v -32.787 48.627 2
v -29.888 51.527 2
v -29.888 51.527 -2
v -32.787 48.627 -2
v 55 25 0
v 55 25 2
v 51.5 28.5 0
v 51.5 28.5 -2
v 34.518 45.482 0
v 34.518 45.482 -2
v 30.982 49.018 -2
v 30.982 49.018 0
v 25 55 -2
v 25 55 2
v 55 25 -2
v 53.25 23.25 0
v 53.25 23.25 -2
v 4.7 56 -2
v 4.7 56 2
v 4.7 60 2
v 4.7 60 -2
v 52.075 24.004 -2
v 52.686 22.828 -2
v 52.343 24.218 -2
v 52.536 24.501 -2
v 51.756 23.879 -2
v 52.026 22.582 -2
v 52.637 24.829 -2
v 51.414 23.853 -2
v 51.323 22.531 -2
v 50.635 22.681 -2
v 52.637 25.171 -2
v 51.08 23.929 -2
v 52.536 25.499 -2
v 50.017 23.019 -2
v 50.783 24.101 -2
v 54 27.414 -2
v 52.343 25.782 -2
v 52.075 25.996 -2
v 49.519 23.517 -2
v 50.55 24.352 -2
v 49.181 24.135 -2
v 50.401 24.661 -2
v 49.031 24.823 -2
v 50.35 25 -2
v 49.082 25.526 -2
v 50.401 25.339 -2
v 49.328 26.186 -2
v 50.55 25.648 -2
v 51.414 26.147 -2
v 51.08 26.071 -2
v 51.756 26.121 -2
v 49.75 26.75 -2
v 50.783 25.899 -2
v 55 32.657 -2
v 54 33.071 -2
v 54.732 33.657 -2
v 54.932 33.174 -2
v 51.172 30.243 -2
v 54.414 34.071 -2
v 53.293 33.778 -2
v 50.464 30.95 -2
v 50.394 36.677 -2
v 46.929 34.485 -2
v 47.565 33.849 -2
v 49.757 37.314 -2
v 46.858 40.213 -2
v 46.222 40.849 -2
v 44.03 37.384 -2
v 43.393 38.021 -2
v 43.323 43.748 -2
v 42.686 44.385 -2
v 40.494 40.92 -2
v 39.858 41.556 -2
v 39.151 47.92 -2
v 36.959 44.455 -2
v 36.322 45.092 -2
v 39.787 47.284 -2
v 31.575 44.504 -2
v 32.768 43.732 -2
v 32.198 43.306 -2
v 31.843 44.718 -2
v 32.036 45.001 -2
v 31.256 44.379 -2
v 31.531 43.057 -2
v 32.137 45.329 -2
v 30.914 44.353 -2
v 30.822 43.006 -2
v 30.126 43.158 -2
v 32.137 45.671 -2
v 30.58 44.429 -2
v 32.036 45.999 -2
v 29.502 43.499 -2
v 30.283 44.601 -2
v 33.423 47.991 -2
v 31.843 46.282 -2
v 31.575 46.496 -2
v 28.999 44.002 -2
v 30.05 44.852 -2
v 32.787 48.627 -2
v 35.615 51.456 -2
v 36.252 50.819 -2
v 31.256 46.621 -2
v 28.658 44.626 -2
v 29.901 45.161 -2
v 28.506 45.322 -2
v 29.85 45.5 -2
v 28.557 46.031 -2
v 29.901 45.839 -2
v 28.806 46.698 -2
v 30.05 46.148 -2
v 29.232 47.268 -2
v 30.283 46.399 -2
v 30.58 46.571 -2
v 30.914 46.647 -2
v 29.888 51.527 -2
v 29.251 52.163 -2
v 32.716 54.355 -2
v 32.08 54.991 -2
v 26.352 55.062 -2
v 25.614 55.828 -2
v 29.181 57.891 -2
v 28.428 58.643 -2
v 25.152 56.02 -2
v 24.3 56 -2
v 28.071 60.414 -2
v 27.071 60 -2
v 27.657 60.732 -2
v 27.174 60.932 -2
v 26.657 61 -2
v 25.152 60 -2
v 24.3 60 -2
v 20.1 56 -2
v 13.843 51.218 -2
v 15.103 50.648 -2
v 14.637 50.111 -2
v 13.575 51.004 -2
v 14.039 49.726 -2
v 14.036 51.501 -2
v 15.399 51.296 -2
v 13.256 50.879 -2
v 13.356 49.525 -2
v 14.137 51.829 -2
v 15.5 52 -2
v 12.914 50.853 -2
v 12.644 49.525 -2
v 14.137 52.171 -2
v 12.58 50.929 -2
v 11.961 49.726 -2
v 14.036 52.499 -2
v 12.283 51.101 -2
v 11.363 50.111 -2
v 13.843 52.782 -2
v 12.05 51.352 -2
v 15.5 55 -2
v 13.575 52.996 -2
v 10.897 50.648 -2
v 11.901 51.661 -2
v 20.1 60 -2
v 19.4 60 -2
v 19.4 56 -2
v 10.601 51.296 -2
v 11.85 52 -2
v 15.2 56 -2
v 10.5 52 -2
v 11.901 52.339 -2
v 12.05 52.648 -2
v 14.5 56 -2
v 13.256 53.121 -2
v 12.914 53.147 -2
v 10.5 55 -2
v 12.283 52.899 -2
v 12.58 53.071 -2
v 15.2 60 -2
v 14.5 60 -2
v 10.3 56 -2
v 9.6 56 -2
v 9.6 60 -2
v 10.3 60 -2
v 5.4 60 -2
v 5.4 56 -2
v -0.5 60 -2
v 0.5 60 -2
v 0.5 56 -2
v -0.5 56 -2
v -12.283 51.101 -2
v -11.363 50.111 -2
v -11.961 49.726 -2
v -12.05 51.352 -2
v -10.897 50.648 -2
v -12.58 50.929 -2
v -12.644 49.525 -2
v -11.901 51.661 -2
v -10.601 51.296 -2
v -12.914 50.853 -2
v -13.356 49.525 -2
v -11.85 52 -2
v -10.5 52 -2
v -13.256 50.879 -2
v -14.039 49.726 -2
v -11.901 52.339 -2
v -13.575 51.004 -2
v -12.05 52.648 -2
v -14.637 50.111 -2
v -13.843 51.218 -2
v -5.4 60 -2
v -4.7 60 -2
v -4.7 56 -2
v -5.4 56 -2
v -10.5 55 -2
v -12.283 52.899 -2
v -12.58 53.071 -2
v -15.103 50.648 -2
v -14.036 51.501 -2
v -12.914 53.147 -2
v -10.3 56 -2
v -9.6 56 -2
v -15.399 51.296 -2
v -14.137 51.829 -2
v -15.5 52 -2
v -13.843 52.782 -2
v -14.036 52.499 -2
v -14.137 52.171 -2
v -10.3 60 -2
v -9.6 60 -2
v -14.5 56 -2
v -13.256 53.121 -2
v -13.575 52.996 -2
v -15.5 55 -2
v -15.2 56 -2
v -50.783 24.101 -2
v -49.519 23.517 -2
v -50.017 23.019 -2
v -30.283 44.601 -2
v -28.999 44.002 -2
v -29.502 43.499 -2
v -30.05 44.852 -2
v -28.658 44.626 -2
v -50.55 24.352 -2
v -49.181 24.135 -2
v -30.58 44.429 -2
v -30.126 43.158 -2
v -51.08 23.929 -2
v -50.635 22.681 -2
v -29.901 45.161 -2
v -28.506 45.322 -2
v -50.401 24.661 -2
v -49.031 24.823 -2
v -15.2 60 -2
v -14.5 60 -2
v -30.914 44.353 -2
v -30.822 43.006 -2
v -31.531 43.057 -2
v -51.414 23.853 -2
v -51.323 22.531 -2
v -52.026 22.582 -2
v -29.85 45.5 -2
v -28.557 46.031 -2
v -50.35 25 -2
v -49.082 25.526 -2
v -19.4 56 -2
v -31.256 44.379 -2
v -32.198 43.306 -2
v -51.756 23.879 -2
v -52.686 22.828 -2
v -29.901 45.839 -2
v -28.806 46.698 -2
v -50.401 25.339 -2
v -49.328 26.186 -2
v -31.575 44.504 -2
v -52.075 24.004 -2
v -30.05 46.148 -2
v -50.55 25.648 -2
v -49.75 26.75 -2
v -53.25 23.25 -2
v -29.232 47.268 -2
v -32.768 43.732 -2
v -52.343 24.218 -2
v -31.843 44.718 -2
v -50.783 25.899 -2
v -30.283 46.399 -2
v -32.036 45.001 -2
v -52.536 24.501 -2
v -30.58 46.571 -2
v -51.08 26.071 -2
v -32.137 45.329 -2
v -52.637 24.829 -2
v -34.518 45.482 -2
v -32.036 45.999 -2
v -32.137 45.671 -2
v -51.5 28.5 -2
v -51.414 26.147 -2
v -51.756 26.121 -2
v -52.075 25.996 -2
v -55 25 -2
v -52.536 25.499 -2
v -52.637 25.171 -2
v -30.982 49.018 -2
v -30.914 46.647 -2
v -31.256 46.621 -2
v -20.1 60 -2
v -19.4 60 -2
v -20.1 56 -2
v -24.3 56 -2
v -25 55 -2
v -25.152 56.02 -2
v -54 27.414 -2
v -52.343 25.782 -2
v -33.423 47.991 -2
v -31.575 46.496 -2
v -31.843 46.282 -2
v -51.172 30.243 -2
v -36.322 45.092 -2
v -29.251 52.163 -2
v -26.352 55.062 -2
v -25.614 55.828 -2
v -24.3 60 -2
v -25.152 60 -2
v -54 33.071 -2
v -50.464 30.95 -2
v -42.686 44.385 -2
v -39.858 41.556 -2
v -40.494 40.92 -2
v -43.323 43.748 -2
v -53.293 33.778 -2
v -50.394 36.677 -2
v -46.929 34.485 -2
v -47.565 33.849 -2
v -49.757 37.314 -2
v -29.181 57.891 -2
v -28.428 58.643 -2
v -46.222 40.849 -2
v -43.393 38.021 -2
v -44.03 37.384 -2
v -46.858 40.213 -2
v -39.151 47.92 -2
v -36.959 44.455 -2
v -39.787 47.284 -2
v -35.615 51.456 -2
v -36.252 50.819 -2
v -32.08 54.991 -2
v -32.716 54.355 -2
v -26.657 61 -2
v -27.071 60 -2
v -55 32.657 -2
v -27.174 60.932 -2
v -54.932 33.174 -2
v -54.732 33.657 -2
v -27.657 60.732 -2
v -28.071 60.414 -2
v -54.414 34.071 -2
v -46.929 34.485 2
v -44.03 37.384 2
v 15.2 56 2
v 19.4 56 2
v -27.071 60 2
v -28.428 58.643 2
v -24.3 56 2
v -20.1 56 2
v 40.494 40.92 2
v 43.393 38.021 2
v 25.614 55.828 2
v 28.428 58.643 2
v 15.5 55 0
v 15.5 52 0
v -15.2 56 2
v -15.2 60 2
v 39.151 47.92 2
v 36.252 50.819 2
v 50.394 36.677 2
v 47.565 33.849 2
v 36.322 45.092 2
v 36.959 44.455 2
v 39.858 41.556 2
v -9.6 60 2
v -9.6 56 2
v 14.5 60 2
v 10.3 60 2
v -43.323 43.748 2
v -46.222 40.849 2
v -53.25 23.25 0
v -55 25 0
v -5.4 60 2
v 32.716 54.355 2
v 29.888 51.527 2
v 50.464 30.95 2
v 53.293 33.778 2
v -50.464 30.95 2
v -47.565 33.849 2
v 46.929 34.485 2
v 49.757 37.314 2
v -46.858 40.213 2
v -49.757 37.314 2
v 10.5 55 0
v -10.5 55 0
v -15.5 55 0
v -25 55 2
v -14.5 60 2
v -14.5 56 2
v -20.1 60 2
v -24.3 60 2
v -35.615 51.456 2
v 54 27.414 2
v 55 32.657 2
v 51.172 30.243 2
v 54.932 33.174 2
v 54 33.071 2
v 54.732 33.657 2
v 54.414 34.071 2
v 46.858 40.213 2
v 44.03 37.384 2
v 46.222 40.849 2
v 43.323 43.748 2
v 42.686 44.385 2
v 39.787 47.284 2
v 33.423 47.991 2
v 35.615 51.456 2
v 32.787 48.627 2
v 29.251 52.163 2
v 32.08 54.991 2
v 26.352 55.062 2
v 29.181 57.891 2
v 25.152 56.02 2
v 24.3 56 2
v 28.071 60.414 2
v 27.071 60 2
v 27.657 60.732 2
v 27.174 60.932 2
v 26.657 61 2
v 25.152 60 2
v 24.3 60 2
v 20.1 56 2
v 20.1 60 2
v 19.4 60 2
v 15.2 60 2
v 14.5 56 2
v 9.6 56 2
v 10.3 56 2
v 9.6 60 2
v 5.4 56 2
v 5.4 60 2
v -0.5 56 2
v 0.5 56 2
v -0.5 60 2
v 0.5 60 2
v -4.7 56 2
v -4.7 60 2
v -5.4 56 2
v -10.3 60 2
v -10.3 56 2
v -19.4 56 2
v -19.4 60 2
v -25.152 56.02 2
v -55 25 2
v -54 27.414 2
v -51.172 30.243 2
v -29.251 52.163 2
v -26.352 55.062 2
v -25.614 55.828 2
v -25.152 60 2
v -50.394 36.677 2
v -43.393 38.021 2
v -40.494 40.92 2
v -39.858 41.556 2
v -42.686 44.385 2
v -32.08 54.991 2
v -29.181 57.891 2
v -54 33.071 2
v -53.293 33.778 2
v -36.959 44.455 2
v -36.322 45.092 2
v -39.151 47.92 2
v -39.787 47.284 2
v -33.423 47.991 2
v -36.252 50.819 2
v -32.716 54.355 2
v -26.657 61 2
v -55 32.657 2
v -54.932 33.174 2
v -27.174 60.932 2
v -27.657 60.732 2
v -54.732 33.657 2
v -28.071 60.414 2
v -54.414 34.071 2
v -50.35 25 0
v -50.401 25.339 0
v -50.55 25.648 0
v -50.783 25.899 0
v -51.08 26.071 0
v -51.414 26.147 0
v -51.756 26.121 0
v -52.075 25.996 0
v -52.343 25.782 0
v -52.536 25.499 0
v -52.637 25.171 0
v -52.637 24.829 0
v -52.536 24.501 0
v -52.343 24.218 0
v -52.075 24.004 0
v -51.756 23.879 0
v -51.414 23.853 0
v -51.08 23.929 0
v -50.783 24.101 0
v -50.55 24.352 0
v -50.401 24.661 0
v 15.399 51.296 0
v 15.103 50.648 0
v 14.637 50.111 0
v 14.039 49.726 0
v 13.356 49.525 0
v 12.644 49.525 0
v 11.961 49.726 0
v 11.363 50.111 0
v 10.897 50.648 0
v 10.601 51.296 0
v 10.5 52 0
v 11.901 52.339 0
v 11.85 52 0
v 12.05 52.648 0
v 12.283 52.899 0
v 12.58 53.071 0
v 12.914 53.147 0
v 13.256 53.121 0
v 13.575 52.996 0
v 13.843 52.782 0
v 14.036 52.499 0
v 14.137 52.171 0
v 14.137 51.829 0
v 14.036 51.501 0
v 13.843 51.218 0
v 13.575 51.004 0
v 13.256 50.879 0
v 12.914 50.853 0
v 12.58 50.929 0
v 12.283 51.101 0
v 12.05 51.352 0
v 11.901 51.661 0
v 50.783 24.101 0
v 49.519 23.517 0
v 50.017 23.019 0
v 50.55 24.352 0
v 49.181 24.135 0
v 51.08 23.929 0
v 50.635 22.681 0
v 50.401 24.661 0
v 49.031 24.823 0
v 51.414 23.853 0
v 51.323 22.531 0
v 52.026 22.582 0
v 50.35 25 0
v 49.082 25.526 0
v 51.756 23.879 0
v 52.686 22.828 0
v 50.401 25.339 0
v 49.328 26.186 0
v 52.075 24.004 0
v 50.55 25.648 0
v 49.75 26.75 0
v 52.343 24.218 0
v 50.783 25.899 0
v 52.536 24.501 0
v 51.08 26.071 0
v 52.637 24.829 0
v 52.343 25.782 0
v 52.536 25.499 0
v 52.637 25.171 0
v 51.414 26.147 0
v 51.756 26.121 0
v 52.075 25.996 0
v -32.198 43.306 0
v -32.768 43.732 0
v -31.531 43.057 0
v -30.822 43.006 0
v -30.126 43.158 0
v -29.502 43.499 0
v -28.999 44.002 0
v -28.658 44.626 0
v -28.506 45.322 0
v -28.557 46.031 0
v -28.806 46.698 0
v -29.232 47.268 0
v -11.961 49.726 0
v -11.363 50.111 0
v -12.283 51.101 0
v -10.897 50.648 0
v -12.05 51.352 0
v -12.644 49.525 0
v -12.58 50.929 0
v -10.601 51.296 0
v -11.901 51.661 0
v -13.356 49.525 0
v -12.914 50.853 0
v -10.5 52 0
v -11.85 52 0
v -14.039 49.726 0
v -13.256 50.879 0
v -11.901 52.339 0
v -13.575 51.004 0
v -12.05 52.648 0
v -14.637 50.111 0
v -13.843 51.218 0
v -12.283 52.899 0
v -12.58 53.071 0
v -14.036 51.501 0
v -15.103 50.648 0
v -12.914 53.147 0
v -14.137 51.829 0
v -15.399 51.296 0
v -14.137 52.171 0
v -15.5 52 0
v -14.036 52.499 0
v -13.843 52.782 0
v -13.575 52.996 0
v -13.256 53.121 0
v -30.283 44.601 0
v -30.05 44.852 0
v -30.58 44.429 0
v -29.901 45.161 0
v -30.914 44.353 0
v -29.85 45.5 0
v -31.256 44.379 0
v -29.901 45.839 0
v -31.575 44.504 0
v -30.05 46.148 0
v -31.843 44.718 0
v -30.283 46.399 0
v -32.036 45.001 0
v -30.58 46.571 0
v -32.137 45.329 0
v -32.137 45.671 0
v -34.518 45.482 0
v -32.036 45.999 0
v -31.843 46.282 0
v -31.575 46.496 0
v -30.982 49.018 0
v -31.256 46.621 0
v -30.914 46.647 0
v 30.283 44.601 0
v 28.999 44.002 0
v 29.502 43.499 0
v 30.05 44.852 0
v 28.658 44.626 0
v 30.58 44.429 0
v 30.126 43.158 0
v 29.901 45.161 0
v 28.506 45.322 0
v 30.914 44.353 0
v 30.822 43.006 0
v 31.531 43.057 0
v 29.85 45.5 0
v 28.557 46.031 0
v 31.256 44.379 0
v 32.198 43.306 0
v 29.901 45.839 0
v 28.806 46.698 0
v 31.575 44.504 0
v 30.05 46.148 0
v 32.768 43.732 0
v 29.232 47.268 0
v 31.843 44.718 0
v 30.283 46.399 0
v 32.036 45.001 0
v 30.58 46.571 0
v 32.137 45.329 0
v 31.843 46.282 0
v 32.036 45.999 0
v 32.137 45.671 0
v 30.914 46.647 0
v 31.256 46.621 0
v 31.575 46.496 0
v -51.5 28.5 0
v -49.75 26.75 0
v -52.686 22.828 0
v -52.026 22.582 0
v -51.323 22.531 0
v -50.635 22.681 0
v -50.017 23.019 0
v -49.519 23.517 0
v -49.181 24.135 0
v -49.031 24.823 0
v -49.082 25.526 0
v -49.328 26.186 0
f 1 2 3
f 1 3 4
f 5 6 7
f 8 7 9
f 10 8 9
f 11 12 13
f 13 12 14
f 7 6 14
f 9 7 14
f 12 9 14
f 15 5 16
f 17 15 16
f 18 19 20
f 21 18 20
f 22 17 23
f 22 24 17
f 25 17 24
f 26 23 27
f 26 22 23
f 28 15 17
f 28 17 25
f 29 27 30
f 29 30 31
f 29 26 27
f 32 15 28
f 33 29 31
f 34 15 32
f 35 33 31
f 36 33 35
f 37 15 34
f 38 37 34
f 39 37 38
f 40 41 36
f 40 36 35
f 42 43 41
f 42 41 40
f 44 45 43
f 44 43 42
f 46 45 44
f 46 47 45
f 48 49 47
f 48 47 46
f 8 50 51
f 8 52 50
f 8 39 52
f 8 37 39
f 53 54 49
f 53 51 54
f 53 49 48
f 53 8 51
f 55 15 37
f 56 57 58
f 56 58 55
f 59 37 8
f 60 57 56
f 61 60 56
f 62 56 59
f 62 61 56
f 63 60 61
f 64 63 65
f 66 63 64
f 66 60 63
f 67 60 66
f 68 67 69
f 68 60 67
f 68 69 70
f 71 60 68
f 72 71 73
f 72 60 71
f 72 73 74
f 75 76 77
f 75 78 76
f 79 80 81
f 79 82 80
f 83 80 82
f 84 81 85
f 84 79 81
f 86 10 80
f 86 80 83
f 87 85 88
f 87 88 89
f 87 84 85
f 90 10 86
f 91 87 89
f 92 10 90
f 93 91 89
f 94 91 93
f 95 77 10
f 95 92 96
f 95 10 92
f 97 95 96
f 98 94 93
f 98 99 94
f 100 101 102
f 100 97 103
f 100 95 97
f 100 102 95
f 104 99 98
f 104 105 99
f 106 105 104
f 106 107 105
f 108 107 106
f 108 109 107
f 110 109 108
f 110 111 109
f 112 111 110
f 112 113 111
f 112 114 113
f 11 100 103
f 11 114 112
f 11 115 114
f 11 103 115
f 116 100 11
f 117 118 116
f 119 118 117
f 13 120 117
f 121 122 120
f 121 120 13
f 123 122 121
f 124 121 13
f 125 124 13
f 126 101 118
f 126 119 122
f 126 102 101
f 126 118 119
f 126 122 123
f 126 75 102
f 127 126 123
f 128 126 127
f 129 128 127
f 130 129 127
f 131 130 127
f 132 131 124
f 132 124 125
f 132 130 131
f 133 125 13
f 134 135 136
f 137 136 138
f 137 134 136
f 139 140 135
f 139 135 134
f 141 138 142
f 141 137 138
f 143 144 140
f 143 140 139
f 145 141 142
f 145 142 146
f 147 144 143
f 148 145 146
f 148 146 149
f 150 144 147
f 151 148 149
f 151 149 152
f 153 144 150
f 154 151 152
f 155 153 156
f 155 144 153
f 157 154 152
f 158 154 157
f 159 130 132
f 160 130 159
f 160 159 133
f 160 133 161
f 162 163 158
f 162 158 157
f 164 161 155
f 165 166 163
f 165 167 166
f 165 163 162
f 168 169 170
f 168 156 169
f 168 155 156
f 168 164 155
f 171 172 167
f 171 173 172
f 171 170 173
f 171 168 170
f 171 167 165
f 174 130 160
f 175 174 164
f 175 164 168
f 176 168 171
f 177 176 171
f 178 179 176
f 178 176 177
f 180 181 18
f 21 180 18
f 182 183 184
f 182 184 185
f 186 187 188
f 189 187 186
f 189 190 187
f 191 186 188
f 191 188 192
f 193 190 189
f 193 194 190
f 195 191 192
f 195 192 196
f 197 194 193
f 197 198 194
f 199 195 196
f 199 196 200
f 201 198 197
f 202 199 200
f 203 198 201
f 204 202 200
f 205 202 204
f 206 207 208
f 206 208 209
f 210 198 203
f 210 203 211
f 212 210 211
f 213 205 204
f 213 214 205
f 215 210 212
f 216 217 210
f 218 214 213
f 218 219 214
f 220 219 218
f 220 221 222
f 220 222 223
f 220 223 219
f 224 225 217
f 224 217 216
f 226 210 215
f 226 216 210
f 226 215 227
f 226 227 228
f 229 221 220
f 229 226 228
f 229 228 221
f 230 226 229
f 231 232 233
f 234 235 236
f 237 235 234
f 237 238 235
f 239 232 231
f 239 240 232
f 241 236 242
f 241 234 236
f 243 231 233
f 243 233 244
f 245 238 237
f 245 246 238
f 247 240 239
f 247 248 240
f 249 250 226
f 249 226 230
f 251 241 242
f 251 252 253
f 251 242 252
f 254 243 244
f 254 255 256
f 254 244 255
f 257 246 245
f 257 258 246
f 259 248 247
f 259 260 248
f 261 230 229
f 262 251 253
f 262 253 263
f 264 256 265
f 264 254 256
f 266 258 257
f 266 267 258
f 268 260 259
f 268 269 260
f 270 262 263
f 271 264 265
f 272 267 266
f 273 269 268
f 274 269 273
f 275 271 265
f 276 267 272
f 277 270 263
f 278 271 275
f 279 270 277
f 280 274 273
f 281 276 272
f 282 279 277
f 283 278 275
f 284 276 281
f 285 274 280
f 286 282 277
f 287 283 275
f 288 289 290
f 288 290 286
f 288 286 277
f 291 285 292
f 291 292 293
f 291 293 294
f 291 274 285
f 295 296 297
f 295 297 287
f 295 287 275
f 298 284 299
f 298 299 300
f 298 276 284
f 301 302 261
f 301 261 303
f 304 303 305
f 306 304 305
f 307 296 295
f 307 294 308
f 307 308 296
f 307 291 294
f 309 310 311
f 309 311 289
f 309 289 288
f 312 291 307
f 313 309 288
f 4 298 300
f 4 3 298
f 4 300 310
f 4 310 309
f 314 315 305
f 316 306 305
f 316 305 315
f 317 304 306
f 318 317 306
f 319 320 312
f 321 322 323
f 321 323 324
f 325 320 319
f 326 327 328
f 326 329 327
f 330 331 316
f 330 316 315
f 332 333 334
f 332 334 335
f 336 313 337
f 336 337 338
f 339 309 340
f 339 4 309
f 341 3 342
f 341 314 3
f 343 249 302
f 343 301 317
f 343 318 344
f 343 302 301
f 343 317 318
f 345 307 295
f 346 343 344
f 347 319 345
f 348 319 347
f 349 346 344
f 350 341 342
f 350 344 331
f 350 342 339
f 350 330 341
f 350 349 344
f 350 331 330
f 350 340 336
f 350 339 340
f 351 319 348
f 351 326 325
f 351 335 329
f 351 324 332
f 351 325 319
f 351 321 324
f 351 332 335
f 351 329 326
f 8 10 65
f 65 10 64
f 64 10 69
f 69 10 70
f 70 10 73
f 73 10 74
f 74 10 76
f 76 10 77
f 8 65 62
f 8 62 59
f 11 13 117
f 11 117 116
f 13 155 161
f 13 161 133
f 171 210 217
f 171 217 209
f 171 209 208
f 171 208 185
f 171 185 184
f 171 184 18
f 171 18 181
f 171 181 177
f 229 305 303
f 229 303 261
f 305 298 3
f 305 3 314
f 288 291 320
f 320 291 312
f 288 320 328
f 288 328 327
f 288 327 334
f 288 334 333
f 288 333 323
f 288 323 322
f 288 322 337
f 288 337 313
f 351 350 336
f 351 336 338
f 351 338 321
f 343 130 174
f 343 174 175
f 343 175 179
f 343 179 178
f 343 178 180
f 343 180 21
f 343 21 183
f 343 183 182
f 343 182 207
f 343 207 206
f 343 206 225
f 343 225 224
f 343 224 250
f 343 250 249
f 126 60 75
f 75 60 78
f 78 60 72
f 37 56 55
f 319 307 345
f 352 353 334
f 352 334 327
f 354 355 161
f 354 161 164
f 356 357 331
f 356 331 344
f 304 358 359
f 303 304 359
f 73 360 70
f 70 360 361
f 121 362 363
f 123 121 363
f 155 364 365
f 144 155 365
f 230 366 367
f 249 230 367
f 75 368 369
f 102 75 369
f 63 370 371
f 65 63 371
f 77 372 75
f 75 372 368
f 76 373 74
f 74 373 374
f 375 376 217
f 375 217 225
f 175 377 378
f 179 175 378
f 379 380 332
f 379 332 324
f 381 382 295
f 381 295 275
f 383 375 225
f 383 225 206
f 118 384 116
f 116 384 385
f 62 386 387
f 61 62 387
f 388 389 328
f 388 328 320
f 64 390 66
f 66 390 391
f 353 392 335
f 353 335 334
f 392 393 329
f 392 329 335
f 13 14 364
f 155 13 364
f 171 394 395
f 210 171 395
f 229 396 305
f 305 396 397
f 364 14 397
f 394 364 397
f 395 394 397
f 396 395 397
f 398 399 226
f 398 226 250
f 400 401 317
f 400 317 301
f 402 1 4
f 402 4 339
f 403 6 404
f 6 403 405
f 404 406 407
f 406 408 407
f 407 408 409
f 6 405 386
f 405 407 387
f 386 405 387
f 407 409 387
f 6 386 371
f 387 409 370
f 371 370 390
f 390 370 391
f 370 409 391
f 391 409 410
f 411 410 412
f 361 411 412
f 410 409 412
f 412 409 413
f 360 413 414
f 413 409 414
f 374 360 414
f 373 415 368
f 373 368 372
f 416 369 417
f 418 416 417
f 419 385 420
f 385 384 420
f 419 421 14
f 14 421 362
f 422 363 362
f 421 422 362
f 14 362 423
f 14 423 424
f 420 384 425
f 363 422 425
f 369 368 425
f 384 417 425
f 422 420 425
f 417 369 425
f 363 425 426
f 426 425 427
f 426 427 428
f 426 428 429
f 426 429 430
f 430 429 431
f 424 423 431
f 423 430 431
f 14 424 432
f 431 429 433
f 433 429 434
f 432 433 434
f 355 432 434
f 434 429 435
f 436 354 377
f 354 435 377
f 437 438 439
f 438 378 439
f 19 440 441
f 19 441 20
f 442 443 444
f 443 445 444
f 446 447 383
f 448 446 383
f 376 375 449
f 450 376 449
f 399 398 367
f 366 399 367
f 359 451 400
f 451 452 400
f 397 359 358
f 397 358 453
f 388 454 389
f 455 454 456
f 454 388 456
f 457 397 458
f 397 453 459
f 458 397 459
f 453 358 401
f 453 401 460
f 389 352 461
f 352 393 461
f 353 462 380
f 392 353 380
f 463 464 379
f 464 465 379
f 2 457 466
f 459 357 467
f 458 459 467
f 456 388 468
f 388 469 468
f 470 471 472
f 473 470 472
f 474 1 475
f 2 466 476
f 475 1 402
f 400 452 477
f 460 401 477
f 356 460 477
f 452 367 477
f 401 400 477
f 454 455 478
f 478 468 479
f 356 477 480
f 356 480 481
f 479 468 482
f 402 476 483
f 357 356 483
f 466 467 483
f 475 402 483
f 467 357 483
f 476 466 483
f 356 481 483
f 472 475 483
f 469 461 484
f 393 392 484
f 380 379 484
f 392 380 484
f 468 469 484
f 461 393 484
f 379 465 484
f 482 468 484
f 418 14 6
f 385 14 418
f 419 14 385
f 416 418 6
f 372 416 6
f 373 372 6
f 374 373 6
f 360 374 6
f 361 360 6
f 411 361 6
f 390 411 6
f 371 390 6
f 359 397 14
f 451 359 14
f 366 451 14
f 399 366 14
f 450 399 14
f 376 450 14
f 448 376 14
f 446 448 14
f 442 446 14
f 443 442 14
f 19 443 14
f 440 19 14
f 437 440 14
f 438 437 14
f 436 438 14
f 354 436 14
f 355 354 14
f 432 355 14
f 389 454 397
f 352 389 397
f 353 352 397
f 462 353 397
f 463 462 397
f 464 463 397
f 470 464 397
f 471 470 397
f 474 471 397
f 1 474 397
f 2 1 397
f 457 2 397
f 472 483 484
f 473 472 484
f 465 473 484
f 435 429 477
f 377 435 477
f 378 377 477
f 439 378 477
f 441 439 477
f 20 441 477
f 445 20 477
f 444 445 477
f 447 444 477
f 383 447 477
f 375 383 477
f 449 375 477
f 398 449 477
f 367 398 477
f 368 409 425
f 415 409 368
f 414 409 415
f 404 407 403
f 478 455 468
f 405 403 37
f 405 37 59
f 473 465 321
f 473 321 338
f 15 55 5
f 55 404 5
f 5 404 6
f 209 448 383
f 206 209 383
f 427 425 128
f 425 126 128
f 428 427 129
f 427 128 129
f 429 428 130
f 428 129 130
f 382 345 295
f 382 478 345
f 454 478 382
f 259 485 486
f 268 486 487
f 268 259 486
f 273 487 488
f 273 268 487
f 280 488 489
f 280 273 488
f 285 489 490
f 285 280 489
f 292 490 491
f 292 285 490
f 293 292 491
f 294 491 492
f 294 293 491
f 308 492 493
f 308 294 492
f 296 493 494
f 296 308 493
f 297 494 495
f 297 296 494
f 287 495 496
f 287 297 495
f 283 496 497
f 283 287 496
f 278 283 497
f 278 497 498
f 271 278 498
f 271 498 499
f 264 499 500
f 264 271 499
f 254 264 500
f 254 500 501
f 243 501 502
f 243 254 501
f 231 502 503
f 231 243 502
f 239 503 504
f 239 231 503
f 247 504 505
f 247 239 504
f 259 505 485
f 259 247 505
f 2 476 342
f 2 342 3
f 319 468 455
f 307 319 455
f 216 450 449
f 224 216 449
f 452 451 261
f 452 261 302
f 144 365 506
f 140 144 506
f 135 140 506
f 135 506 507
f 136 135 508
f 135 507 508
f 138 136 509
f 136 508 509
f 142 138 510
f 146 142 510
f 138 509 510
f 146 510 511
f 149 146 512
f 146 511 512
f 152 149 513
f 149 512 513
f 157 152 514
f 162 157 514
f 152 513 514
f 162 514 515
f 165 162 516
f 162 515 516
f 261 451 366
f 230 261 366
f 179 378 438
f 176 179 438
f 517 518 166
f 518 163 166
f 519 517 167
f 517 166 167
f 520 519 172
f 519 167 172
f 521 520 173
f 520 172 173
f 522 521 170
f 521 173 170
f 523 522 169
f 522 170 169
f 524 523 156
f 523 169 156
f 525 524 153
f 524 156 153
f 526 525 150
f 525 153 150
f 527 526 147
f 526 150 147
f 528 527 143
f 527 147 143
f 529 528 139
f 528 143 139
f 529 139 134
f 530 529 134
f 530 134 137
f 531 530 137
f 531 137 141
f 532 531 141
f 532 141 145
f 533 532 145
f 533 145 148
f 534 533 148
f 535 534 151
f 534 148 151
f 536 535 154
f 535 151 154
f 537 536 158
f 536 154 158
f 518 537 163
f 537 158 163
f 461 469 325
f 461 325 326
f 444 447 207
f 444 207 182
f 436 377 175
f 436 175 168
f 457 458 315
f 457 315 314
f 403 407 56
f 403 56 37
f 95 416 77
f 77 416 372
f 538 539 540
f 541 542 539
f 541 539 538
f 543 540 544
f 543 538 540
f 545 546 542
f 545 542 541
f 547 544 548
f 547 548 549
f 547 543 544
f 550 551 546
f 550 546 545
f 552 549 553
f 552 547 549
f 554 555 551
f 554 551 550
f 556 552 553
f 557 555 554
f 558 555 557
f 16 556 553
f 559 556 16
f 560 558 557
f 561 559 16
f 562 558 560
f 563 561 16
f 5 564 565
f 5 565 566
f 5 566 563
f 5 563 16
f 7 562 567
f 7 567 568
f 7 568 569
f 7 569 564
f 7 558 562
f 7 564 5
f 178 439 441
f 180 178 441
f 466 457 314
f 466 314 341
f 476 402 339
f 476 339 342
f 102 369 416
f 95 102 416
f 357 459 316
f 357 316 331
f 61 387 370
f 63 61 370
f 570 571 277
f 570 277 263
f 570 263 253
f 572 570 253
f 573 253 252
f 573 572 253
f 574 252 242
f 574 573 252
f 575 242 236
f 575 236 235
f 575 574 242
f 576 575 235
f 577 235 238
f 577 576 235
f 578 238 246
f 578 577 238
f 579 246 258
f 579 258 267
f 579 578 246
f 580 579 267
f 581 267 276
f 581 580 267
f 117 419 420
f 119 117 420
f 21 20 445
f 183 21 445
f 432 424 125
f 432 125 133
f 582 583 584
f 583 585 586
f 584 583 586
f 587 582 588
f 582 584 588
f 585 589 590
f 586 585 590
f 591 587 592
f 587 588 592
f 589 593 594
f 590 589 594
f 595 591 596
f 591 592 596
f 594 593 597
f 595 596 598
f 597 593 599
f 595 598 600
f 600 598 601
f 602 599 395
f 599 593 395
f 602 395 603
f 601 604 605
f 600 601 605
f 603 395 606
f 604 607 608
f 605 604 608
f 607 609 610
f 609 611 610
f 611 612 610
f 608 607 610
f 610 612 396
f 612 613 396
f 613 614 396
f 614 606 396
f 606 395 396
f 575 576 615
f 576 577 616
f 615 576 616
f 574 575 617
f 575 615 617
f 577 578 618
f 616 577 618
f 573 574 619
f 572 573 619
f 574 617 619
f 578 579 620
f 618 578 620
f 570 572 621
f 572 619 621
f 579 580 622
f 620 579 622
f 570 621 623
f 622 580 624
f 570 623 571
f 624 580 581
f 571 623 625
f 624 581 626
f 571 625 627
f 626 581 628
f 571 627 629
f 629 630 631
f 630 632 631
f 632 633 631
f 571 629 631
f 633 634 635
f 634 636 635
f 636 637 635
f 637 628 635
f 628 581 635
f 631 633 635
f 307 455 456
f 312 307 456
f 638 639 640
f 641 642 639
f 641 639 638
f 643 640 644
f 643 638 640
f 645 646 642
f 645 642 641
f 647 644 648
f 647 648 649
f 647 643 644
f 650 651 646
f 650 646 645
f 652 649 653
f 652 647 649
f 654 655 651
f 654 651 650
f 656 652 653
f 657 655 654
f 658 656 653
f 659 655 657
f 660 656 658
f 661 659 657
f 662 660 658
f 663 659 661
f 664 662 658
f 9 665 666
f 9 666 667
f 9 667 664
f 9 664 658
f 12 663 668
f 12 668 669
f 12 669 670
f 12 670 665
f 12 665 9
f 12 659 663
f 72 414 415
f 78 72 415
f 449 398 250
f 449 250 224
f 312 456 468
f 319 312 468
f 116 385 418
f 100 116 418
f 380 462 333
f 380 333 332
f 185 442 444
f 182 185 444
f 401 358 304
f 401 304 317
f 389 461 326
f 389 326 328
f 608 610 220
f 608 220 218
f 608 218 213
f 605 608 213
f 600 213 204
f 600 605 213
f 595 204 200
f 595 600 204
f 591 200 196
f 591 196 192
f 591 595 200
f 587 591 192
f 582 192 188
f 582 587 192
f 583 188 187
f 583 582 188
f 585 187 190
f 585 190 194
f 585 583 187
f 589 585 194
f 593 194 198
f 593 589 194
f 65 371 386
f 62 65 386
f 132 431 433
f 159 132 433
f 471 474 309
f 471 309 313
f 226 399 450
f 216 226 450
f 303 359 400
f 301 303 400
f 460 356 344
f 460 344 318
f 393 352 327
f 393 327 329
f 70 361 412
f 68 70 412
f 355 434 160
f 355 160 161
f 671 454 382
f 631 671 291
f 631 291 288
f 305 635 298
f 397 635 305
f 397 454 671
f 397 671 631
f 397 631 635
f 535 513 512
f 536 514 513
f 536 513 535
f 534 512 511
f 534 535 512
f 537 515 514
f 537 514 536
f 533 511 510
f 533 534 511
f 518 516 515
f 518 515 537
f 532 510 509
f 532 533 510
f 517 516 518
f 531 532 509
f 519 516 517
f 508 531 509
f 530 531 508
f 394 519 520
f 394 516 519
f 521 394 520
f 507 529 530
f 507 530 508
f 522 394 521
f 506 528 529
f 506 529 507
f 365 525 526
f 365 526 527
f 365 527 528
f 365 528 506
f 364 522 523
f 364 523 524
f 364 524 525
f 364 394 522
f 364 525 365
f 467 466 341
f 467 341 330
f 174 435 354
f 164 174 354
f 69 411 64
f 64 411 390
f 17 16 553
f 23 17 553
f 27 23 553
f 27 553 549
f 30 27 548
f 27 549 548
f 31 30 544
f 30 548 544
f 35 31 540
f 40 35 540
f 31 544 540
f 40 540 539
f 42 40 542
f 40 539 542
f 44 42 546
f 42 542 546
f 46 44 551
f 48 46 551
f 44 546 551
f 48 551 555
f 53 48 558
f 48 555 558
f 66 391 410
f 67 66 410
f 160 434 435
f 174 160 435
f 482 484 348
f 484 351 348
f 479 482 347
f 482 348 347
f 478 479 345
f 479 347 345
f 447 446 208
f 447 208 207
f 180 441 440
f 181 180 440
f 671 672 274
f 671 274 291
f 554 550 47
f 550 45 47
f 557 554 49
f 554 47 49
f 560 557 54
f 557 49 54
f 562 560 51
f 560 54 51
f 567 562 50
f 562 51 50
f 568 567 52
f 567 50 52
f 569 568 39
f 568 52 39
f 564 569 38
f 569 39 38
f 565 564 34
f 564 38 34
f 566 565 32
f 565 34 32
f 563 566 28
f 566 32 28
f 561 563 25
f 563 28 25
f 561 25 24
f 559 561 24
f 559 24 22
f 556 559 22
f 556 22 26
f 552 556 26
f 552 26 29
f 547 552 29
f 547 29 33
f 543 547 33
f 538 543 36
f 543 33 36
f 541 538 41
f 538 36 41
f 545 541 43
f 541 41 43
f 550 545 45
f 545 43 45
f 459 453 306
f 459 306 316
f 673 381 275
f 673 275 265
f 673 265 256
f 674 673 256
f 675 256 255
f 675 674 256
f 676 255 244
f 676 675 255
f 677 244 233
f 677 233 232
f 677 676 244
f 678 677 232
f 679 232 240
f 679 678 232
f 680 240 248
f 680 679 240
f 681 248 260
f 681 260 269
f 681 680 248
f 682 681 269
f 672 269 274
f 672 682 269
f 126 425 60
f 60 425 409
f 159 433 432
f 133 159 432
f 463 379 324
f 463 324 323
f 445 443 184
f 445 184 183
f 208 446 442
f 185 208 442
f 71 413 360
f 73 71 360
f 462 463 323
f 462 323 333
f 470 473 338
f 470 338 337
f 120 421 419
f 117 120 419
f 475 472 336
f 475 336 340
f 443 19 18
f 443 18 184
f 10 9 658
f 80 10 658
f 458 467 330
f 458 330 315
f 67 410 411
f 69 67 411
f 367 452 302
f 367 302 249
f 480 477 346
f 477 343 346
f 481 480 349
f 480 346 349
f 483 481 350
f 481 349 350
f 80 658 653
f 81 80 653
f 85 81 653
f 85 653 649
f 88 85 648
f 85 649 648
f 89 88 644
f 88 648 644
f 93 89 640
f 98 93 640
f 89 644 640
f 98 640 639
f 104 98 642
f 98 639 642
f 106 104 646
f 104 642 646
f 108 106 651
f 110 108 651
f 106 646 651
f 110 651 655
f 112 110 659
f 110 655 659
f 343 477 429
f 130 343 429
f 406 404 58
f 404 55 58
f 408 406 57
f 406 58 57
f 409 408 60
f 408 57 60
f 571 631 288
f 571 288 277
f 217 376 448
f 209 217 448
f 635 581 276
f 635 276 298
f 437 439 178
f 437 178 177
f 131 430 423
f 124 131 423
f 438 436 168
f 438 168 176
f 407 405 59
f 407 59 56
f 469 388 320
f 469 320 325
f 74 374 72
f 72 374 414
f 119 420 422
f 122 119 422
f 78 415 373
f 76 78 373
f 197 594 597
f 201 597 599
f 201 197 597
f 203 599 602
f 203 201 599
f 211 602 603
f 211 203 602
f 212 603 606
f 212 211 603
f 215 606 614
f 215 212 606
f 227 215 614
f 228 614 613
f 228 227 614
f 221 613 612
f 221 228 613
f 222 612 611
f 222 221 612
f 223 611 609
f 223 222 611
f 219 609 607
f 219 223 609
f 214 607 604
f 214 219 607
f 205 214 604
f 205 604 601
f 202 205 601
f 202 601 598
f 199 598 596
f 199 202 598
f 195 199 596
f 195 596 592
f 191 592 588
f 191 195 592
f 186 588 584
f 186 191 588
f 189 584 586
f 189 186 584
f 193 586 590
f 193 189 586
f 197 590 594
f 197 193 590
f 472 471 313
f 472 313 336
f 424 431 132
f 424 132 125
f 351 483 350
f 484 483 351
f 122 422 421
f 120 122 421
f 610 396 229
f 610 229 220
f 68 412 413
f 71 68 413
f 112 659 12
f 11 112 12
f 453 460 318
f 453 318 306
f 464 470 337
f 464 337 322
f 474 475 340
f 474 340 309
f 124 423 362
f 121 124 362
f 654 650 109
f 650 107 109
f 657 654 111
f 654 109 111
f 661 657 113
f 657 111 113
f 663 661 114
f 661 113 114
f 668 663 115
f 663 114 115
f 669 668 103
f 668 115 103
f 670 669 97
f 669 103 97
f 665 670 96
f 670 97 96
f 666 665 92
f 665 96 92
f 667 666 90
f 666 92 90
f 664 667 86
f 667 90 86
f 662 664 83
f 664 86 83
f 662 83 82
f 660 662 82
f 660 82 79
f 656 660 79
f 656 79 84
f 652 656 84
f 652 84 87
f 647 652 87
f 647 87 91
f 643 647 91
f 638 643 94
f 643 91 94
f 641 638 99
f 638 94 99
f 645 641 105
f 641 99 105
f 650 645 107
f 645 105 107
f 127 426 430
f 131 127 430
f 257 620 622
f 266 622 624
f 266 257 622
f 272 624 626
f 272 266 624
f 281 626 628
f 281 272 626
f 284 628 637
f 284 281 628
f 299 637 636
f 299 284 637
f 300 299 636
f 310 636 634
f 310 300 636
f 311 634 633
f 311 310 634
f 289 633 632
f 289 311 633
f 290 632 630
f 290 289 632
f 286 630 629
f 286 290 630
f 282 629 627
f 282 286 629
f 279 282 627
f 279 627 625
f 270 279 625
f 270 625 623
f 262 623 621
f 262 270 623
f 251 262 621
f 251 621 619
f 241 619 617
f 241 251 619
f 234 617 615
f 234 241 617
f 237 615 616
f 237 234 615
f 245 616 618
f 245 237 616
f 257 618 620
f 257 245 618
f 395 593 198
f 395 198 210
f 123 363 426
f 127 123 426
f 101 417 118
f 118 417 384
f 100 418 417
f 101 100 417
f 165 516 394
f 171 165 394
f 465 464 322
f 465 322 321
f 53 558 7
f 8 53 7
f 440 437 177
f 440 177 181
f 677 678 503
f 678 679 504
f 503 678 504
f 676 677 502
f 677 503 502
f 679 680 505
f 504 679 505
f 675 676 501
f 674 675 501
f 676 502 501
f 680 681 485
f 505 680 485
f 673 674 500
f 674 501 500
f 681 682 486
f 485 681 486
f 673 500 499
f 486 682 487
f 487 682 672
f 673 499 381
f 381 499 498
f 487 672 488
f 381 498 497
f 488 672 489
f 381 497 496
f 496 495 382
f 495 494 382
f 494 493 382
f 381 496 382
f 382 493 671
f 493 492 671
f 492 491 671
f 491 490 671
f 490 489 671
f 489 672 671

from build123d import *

# Parameters (mm, degrees)
SKETCH3_R                = 1.15
BOSS_EXTRUDE1_DEPTH      = 2
CUT_EXTRUDE4_DEPTH       = 2
FILLET1_R                = 2
CUT_EXTRUDE1_DEPTH       = 83.231380871
CUT_EXTRUDE2_DEPTH       = 83.158383626
LPATTERN1_COUNT          = 7
LPATTERN1_PITCH          = 5
SKETCH7_W                = 4.2
SKETCH7_H                = 4
CUT_EXTRUDE3_DEPTH       = 83.158383626
LPATTERN2_COUNT          = 5
LPATTERN2_PITCH          = 4.9
MIRROR1_COPY_1_DEPTH     = 83.158383626
MIRROR1_COPY_2_DEPTH     = 83.158383626
MIRROR1_COPY_3_DEPTH     = 83.158383626
MIRROR1_COPY_4_DEPTH     = 83.158383626
MIRROR1_COPY_5_DEPTH     = 83.158383626
MIRROR1_COPY_6_DEPTH     = 83.158383626
MIRROR1_COPY_7_SKETCH_W  = 4.2
MIRROR1_COPY_7_SKETCH_H  = 4
MIRROR1_COPY_7_DEPTH     = 83.158383626
MIRROR1_COPY_8_SKETCH_W  = 4.2
MIRROR1_COPY_8_SKETCH_H  = 4
MIRROR1_COPY_8_DEPTH     = 83.158383626
MIRROR1_COPY_9_SKETCH_W  = 4.2
MIRROR1_COPY_9_SKETCH_H  = 4
MIRROR1_COPY_9_DEPTH     = 83.158383626
MIRROR1_COPY_10_SKETCH_W = 4.2
MIRROR1_COPY_10_SKETCH_H = 4
MIRROR1_COPY_10_DEPTH    = 83.158383626
FILLET1_OF_MIRROR1_R     = 2


with BuildPart() as part:
    # Sketch3 → Boss-Extrude1 (new, symmetric)
    with BuildSketch(Plane.XY):
        with BuildLine():
            Line((-55, 25), (-53.25, 23.25))
            ThreePointArc((-53.25, 23.25), (-49.75, 23.25), (-49.75, 26.75))
            Line((-49.75, 26.75), (-51.5, 28.5))
            Line((-51.5, 28.5), (-34.517766953, 45.482233047))
            Line((-34.517766953, 45.482233047), (-32.767766953, 43.732233047))
            ThreePointArc((-32.767766953, 43.732233047), (-29.232233047, 43.732233047), (-29.232233047, 47.267766953))
            Line((-29.232233047, 47.267766953), (-30.982233047, 49.017766953))
            Line((-30.982233047, 49.017766953), (-25, 55))
            Line((-25, 55), (-15.5, 55))
            Line((-15.5, 55), (-15.5, 52))
            ThreePointArc((-15.5, 52), (-13, 49.5), (-10.5, 52))
            Line((-10.5, 52), (-10.5, 55))
            Line((-10.5, 55), (0, 55))
            Line((0, 55), (0, 61))
            Line((0, 61), (-27.485281374, 61))
            Line((-27.485281374, 61), (-55, 33.485281374))
            Line((-55, 33.485281374), (-55, 25))
        make_face()
        with Locations((-13, 52)):
            Circle(SKETCH3_R, mode=Mode.SUBTRACT)
        with Locations((-31, 45.5)):
            Circle(SKETCH3_R, mode=Mode.SUBTRACT)
        with Locations((-51.5, 25)):
            Circle(SKETCH3_R, mode=Mode.SUBTRACT)
    boss_extrude1 = extrude(amount=BOSS_EXTRUDE1_DEPTH, both=True)

    # Sketch8 → Cut-Extrude4 (cut)
    with BuildSketch(Plane.XY.offset(2)):
        with BuildLine():
            Line((-55, 25), (-51.5, 28.5))
            Line((-51.5, 28.5), (-49.75, 26.75))
            ThreePointArc((-49.75, 26.75), (-49.75, 23.25), (-53.25, 23.25))
            Line((-53.25, 23.25), (-55, 25))
        make_face()
        with BuildLine():
            Line((-34.517766953, 45.482233047), (-30.982233047, 49.017766953))
            Line((-30.982233047, 49.017766953), (-29.232233047, 47.267766953))
            ThreePointArc((-29.232233047, 47.267766953), (-29.232233047, 43.732233047), (-32.767766953, 43.732233047))
            Line((-32.767766953, 43.732233047), (-34.517766953, 45.482233047))
        make_face()
        with BuildLine():
            Line((-15.5, 55), (-10.5, 55))
            Line((-10.5, 55), (-10.5, 52))
            ThreePointArc((-10.5, 52), (-13, 49.5), (-15.5, 52))
            Line((-15.5, 52), (-15.5, 55))
        make_face()
    cut_extrude4 = extrude(amount=-CUT_EXTRUDE4_DEPTH, mode=Mode.SUBTRACT)

    # Fillet1
    fillet1_edges = [part.edges().sort_by_distance(p)[0] for p in [
        (-55, 33.485281374, 0),
        (-27.485281374, 61, 0),
    ]]
    fillet(fillet1_edges, radius=FILLET1_R)

    # Sketch5 → Cut-Extrude1 (cut, through all)
    with BuildSketch(Plane.XY.offset(2)):
        Polygon((-28.428256226, 58.642811585), (-27.071067812, 60), (-25.151713549, 60), (-25.151713549, 56.019550391), (-25.613653315, 55.828208674), align=None)
        Polygon((-54, 33.071067812), (-54, 27.414213562), (-51.171572875, 30.242640687), align=None)
    cut_extrude1 = extrude(amount=-CUT_EXTRUDE1_DEPTH, mode=Mode.SUBTRACT)

    # Sketch6 → Cut-Extrude2 (cut, symmetric)
    with BuildSketch(Plane.XY):
        Polygon((-53.292893219, 33.778174593), (-50.393755416, 36.677312396), (-47.565328291, 33.848885271), (-50.464466094, 30.949747468), align=None)
    cut_extrude2 = extrude(amount=CUT_EXTRUDE2_DEPTH, both=True, mode=Mode.SUBTRACT)

    # LPattern1: Cut-Extrude2 ×7
    with Locations(*[Vector(0.7071067811865472, 0.7071067811865478, 0) * (i * LPATTERN1_PITCH) for i in range(1, LPATTERN1_COUNT)]):
        add(cut_extrude2, mode=Mode.SUBTRACT)

    # Sketch7 → Cut-Extrude3 (cut, symmetric)
    with BuildSketch(Plane.XY):
        with Locations((-2.6, 58)):
            Rectangle(SKETCH7_W, SKETCH7_H)
    cut_extrude3 = extrude(amount=CUT_EXTRUDE3_DEPTH, both=True, mode=Mode.SUBTRACT)

    # LPattern2: Cut-Extrude3 ×5
    with Locations(*[(-i * LPATTERN2_PITCH, 0, 0) for i in range(1, LPATTERN2_COUNT)]):
        add(cut_extrude3, mode=Mode.SUBTRACT)

    # Mirror1: Boss-Extrude1, Cut-Extrude4, Cut-Extrude1, Cut-Extrude2, Cut-Extrude3 across plane
    add(boss_extrude1.mirror(Plane(origin=(0, 55, 2), x_dir=(0, 0, 1), z_dir=(-1, 0, 0))))
    add(cut_extrude4.mirror(Plane(origin=(0, 55, 2), x_dir=(0, 0, 1), z_dir=(-1, 0, 0))), mode=Mode.SUBTRACT)
    add(cut_extrude1.mirror(Plane(origin=(0, 55, 2), x_dir=(0, 0, 1), z_dir=(-1, 0, 0))), mode=Mode.SUBTRACT)
    add(cut_extrude2.mirror(Plane(origin=(0, 55, 2), x_dir=(0, 0, 1), z_dir=(-1, 0, 0))), mode=Mode.SUBTRACT)
    add(cut_extrude3.mirror(Plane(origin=(0, 55, 2), x_dir=(0, 0, 1), z_dir=(-1, 0, 0))), mode=Mode.SUBTRACT)

    # Mirror1 copy 1 sketch → Mirror1 copy 1 (cut, symmetric)
    with BuildSketch(Plane(origin=(-3.535533906, 3.535533906, 0), x_dir=(-1, 0, 0), z_dir=(0, 0, 1))):
        Polygon((-53.292893219, -33.778174593), (-50.393755416, -36.677312396), (-47.565328291, -33.848885271), (-50.464466094, -30.949747468), align=None)
    extrude(amount=MIRROR1_COPY_1_DEPTH, both=True, mode=Mode.SUBTRACT)

    # Mirror1 copy 2 sketch → Mirror1 copy 2 (cut, symmetric)
    with BuildSketch(Plane(origin=(-7.071067812, 7.071067812, 0), x_dir=(-1, 0, 0), z_dir=(0, 0, 1))):
        Polygon((-53.292893219, -33.778174593), (-50.393755416, -36.677312396), (-47.565328291, -33.848885271), (-50.464466094, -30.949747468), align=None)
    extrude(amount=MIRROR1_COPY_2_DEPTH, both=True, mode=Mode.SUBTRACT)

    # Mirror1 copy 3 sketch → Mirror1 copy 3 (cut, symmetric)
    with BuildSketch(Plane(origin=(-10.606601718, 10.606601718, 0), x_dir=(-1, 0, 0), z_dir=(0, 0, 1))):
        Polygon((-53.292893219, -33.778174593), (-50.393755416, -36.677312396), (-47.565328291, -33.848885271), (-50.464466094, -30.949747468), align=None)
    extrude(amount=MIRROR1_COPY_3_DEPTH, both=True, mode=Mode.SUBTRACT)

    # Mirror1 copy 4 sketch → Mirror1 copy 4 (cut, symmetric)
    with BuildSketch(Plane(origin=(-14.142135624, 14.142135624, 0), x_dir=(-1, 0, 0), z_dir=(0, 0, 1))):
        Polygon((-53.292893219, -33.778174593), (-50.393755416, -36.677312396), (-47.565328291, -33.848885271), (-50.464466094, -30.949747468), align=None)
    extrude(amount=MIRROR1_COPY_4_DEPTH, both=True, mode=Mode.SUBTRACT)

    # Mirror1 copy 5 sketch → Mirror1 copy 5 (cut, symmetric)
    with BuildSketch(Plane(origin=(-17.67766953, 17.67766953, 0), x_dir=(-1, 0, 0), z_dir=(0, 0, 1))):
        Polygon((-53.292893219, -33.778174593), (-50.393755416, -36.677312396), (-47.565328291, -33.848885271), (-50.464466094, -30.949747468), align=None)
    extrude(amount=MIRROR1_COPY_5_DEPTH, both=True, mode=Mode.SUBTRACT)

    # Mirror1 copy 6 sketch → Mirror1 copy 6 (cut, symmetric)
    with BuildSketch(Plane(origin=(-21.213203436, 21.213203436, 0), x_dir=(-1, 0, 0), z_dir=(0, 0, 1))):
        Polygon((-53.292893219, -33.778174593), (-50.393755416, -36.677312396), (-47.565328291, -33.848885271), (-50.464466094, -30.949747468), align=None)
    extrude(amount=MIRROR1_COPY_6_DEPTH, both=True, mode=Mode.SUBTRACT)

    # Mirror1 copy 7 sketch → Mirror1 copy 7 (cut, symmetric)
    with BuildSketch(Plane(origin=(4.9, 0, 0), x_dir=(-1, 0, 0), z_dir=(0, 0, 1))):
        with Locations((-2.6, -58)):
            Rectangle(MIRROR1_COPY_7_SKETCH_W, MIRROR1_COPY_7_SKETCH_H)
    extrude(amount=MIRROR1_COPY_7_DEPTH, both=True, mode=Mode.SUBTRACT)

    # Mirror1 copy 8 sketch → Mirror1 copy 8 (cut, symmetric)
    with BuildSketch(Plane(origin=(9.8, 0, 0), x_dir=(-1, 0, 0), z_dir=(0, 0, 1))):
        with Locations((-2.6, -58)):
            Rectangle(MIRROR1_COPY_8_SKETCH_W, MIRROR1_COPY_8_SKETCH_H)
    extrude(amount=MIRROR1_COPY_8_DEPTH, both=True, mode=Mode.SUBTRACT)

    # Mirror1 copy 9 sketch → Mirror1 copy 9 (cut, symmetric)
    with BuildSketch(Plane(origin=(14.7, 0, 0), x_dir=(-1, 0, 0), z_dir=(0, 0, 1))):
        with Locations((-2.6, -58)):
            Rectangle(MIRROR1_COPY_9_SKETCH_W, MIRROR1_COPY_9_SKETCH_H)
    extrude(amount=MIRROR1_COPY_9_DEPTH, both=True, mode=Mode.SUBTRACT)

    # Mirror1 copy 10 sketch → Mirror1 copy 10 (cut, symmetric)
    with BuildSketch(Plane(origin=(19.6, 0, 0), x_dir=(-1, 0, 0), z_dir=(0, 0, 1))):
        with Locations((-2.6, -58)):
            Rectangle(MIRROR1_COPY_10_SKETCH_W, MIRROR1_COPY_10_SKETCH_H)
    extrude(amount=MIRROR1_COPY_10_DEPTH, both=True, mode=Mode.SUBTRACT)

    # Fillet1 of Mirror1
    fillet1_of_mirror1_edges = [part.edges().sort_by_distance(p)[0] for p in [
        (55, 33.485281374, 0),
        (27.485281374, 61, 0),
    ]]
    fillet(fillet1_of_mirror1_edges, radius=FILLET1_OF_MIRROR1_R)


solid = part.part
